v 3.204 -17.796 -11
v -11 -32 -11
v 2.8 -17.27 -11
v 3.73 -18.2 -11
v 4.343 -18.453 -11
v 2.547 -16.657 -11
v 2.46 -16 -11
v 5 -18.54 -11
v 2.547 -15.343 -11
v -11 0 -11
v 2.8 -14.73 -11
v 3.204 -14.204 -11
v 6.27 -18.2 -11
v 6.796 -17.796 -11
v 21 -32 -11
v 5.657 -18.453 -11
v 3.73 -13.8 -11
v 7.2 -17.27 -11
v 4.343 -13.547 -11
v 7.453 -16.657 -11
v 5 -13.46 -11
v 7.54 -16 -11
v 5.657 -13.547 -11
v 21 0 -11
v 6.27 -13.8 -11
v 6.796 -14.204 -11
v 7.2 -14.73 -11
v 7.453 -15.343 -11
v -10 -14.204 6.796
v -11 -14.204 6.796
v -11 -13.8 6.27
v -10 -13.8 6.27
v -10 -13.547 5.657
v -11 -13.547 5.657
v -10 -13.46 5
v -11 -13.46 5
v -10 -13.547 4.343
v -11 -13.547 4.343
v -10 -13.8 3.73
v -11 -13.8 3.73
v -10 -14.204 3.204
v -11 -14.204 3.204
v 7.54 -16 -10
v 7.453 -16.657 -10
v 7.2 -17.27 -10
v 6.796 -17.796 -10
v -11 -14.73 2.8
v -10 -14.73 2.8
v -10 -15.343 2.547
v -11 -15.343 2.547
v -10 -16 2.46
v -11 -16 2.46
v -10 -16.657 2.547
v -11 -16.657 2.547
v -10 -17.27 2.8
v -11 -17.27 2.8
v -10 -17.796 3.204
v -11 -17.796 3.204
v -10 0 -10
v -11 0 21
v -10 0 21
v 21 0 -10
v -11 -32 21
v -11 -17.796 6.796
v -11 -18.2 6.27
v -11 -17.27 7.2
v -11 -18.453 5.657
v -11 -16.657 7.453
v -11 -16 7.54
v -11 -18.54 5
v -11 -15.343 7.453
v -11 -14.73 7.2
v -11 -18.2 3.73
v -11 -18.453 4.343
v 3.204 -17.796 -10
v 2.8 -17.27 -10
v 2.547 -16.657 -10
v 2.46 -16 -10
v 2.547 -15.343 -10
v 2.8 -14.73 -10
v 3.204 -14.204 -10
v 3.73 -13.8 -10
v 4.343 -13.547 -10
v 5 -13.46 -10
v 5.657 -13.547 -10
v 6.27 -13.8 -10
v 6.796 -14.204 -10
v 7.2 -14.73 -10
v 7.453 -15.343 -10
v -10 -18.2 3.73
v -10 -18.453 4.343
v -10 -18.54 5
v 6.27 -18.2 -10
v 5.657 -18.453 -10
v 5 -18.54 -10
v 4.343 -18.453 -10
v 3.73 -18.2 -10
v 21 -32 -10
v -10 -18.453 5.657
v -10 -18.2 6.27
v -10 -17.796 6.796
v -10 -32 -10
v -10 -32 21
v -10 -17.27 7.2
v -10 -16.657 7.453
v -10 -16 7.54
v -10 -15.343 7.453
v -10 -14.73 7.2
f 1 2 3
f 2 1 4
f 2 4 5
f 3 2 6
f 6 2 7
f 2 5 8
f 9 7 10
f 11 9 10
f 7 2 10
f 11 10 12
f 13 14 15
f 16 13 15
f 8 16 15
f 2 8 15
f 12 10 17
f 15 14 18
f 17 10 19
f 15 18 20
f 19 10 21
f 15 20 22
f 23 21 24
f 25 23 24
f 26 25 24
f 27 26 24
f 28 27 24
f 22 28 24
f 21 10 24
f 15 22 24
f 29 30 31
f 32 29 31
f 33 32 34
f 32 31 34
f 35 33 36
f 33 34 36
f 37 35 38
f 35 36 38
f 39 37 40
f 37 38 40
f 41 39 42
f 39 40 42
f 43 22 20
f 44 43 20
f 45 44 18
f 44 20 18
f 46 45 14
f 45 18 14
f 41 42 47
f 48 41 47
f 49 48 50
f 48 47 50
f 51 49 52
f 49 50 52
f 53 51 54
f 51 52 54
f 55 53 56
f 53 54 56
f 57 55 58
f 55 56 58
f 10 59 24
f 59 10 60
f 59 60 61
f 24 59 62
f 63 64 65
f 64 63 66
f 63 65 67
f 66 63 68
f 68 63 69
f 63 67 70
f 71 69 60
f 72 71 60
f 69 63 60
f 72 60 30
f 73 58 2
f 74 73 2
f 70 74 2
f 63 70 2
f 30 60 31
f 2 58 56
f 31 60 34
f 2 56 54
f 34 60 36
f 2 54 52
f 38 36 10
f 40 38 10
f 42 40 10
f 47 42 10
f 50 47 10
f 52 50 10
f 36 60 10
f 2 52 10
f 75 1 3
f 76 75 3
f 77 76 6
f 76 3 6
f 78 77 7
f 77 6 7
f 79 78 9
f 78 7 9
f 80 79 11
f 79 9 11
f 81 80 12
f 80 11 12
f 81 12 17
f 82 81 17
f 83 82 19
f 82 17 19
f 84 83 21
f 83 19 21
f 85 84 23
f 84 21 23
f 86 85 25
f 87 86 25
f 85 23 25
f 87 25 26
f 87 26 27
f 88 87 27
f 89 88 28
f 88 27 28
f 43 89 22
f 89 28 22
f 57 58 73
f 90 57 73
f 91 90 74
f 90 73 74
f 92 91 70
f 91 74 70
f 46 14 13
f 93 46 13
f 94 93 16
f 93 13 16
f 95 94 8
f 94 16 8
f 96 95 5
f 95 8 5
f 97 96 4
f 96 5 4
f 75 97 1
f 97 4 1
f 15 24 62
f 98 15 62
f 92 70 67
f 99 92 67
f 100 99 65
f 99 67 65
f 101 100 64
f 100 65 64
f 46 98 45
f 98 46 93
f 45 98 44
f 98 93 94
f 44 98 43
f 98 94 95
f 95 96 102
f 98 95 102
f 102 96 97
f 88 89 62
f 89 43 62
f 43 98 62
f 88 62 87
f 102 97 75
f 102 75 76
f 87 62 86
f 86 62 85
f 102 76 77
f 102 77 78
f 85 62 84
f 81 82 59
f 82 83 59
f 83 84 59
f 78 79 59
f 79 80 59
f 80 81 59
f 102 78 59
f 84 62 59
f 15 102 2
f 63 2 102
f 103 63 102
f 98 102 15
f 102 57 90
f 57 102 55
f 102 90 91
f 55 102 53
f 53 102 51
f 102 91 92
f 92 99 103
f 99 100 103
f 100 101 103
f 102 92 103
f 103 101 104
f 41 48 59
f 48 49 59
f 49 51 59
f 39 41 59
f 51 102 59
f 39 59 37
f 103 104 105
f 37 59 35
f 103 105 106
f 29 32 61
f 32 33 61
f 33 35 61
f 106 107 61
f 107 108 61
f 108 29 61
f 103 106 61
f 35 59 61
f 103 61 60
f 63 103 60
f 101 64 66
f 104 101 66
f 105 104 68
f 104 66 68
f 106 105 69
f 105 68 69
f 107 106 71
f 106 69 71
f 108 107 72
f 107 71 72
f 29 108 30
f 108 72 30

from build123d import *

# Parameters (mm, degrees)
F1_DEPTH = 32
F3_DEPTH = 25.4
F5_DEPTH = 25.4


with BuildPart() as f1:
    # F0 (on Front) → F1 (new body)
    with BuildSketch(Plane.XZ):
        Polygon((-10, 21), (-11, 21), (-11, -11), (21, -11), (21, -10), (-10, -10), align=None)
    extrude(amount=F1_DEPTH)

    # F2 (on face) → F3 (cut)
    with BuildSketch(Plane(origin=(-11, 0, 0), x_dir=(0, -1, 0), z_dir=(-1, 0, 0))):
        with BuildLine():
            Line((16, 5), (14.2039487758, 3.2039487758))
            ThreePointArc((14.2039487758, 3.2039487758), (16, 2.46), (17.7960512242, 3.2039487758))
            Line((17.7960512242, 3.2039487758), (16, 5))
        make_face()
        with BuildLine():
            ThreePointArc((14.2039487758, 6.7960512242), (13.46, 5), (14.2039487758, 3.2039487758))
            Line((14.2039487758, 3.2039487758), (16, 5))
            Line((16, 5), (14.2039487758, 6.7960512242))
        make_face()
        with BuildLine():
            Line((14.2039487758, 6.7960512242), (16, 5))
            Line((16, 5), (17.7960512242, 6.7960512242))
            ThreePointArc((17.7960512242, 6.7960512242), (16, 7.54), (14.2039487758, 6.7960512242))
        make_face()
        with BuildLine():
            Line((17.7960512242, 6.7960512242), (16, 5))
            Line((16, 5), (17.7960512242, 3.2039487758))
            ThreePointArc((17.7960512242, 3.2039487758), (18.3466540126, 4.0279840818), (18.54, 5))
            ThreePointArc((18.54, 5), (18.3466540126, 5.9720159182), (17.7960512242, 6.7960512242))
        make_face()
    extrude(amount=-F3_DEPTH, mode=Mode.SUBTRACT)

    # F4 (on face) → F5 (cut)
    with BuildSketch(Plane(origin=(0, 0, -11), x_dir=(1, 0, 0), z_dir=(0, 0, -1))):
        with BuildLine():
            Line((6.7960512242, 17.7960512242), (5, 16))
            Line((5, 16), (6.7960512242, 14.2039487758))
            ThreePointArc((6.7960512242, 14.2039487758), (7.3466540126, 15.0279840818), (7.54, 16))
            ThreePointArc((7.54, 16), (7.3466540126, 16.9720159182), (6.7960512242, 17.7960512242))
        make_face()
        with BuildLine():
            ThreePointArc((6.7960512242, 17.7960512242), (5, 18.54), (3.2039487758, 17.7960512242))
            Line((3.2039487758, 17.7960512242), (5, 16))
            Line((5, 16), (6.7960512242, 17.7960512242))
        make_face()
        with BuildLine():
            Line((6.7960512242, 14.2039487758), (5, 16))
            Line((5, 16), (3.2039487758, 14.2039487758))
            ThreePointArc((3.2039487758, 14.2039487758), (5, 13.46), (6.7960512242, 14.2039487758))
        make_face()
        with BuildLine():
            Line((5, 16), (3.2039487758, 17.7960512242))
            ThreePointArc((3.2039487758, 17.7960512242), (2.46, 16), (3.2039487758, 14.2039487758))
            Line((3.2039487758, 14.2039487758), (5, 16))
        make_face()
    extrude(amount=-F5_DEPTH, mode=Mode.SUBTRACT)


solid = f1.part
